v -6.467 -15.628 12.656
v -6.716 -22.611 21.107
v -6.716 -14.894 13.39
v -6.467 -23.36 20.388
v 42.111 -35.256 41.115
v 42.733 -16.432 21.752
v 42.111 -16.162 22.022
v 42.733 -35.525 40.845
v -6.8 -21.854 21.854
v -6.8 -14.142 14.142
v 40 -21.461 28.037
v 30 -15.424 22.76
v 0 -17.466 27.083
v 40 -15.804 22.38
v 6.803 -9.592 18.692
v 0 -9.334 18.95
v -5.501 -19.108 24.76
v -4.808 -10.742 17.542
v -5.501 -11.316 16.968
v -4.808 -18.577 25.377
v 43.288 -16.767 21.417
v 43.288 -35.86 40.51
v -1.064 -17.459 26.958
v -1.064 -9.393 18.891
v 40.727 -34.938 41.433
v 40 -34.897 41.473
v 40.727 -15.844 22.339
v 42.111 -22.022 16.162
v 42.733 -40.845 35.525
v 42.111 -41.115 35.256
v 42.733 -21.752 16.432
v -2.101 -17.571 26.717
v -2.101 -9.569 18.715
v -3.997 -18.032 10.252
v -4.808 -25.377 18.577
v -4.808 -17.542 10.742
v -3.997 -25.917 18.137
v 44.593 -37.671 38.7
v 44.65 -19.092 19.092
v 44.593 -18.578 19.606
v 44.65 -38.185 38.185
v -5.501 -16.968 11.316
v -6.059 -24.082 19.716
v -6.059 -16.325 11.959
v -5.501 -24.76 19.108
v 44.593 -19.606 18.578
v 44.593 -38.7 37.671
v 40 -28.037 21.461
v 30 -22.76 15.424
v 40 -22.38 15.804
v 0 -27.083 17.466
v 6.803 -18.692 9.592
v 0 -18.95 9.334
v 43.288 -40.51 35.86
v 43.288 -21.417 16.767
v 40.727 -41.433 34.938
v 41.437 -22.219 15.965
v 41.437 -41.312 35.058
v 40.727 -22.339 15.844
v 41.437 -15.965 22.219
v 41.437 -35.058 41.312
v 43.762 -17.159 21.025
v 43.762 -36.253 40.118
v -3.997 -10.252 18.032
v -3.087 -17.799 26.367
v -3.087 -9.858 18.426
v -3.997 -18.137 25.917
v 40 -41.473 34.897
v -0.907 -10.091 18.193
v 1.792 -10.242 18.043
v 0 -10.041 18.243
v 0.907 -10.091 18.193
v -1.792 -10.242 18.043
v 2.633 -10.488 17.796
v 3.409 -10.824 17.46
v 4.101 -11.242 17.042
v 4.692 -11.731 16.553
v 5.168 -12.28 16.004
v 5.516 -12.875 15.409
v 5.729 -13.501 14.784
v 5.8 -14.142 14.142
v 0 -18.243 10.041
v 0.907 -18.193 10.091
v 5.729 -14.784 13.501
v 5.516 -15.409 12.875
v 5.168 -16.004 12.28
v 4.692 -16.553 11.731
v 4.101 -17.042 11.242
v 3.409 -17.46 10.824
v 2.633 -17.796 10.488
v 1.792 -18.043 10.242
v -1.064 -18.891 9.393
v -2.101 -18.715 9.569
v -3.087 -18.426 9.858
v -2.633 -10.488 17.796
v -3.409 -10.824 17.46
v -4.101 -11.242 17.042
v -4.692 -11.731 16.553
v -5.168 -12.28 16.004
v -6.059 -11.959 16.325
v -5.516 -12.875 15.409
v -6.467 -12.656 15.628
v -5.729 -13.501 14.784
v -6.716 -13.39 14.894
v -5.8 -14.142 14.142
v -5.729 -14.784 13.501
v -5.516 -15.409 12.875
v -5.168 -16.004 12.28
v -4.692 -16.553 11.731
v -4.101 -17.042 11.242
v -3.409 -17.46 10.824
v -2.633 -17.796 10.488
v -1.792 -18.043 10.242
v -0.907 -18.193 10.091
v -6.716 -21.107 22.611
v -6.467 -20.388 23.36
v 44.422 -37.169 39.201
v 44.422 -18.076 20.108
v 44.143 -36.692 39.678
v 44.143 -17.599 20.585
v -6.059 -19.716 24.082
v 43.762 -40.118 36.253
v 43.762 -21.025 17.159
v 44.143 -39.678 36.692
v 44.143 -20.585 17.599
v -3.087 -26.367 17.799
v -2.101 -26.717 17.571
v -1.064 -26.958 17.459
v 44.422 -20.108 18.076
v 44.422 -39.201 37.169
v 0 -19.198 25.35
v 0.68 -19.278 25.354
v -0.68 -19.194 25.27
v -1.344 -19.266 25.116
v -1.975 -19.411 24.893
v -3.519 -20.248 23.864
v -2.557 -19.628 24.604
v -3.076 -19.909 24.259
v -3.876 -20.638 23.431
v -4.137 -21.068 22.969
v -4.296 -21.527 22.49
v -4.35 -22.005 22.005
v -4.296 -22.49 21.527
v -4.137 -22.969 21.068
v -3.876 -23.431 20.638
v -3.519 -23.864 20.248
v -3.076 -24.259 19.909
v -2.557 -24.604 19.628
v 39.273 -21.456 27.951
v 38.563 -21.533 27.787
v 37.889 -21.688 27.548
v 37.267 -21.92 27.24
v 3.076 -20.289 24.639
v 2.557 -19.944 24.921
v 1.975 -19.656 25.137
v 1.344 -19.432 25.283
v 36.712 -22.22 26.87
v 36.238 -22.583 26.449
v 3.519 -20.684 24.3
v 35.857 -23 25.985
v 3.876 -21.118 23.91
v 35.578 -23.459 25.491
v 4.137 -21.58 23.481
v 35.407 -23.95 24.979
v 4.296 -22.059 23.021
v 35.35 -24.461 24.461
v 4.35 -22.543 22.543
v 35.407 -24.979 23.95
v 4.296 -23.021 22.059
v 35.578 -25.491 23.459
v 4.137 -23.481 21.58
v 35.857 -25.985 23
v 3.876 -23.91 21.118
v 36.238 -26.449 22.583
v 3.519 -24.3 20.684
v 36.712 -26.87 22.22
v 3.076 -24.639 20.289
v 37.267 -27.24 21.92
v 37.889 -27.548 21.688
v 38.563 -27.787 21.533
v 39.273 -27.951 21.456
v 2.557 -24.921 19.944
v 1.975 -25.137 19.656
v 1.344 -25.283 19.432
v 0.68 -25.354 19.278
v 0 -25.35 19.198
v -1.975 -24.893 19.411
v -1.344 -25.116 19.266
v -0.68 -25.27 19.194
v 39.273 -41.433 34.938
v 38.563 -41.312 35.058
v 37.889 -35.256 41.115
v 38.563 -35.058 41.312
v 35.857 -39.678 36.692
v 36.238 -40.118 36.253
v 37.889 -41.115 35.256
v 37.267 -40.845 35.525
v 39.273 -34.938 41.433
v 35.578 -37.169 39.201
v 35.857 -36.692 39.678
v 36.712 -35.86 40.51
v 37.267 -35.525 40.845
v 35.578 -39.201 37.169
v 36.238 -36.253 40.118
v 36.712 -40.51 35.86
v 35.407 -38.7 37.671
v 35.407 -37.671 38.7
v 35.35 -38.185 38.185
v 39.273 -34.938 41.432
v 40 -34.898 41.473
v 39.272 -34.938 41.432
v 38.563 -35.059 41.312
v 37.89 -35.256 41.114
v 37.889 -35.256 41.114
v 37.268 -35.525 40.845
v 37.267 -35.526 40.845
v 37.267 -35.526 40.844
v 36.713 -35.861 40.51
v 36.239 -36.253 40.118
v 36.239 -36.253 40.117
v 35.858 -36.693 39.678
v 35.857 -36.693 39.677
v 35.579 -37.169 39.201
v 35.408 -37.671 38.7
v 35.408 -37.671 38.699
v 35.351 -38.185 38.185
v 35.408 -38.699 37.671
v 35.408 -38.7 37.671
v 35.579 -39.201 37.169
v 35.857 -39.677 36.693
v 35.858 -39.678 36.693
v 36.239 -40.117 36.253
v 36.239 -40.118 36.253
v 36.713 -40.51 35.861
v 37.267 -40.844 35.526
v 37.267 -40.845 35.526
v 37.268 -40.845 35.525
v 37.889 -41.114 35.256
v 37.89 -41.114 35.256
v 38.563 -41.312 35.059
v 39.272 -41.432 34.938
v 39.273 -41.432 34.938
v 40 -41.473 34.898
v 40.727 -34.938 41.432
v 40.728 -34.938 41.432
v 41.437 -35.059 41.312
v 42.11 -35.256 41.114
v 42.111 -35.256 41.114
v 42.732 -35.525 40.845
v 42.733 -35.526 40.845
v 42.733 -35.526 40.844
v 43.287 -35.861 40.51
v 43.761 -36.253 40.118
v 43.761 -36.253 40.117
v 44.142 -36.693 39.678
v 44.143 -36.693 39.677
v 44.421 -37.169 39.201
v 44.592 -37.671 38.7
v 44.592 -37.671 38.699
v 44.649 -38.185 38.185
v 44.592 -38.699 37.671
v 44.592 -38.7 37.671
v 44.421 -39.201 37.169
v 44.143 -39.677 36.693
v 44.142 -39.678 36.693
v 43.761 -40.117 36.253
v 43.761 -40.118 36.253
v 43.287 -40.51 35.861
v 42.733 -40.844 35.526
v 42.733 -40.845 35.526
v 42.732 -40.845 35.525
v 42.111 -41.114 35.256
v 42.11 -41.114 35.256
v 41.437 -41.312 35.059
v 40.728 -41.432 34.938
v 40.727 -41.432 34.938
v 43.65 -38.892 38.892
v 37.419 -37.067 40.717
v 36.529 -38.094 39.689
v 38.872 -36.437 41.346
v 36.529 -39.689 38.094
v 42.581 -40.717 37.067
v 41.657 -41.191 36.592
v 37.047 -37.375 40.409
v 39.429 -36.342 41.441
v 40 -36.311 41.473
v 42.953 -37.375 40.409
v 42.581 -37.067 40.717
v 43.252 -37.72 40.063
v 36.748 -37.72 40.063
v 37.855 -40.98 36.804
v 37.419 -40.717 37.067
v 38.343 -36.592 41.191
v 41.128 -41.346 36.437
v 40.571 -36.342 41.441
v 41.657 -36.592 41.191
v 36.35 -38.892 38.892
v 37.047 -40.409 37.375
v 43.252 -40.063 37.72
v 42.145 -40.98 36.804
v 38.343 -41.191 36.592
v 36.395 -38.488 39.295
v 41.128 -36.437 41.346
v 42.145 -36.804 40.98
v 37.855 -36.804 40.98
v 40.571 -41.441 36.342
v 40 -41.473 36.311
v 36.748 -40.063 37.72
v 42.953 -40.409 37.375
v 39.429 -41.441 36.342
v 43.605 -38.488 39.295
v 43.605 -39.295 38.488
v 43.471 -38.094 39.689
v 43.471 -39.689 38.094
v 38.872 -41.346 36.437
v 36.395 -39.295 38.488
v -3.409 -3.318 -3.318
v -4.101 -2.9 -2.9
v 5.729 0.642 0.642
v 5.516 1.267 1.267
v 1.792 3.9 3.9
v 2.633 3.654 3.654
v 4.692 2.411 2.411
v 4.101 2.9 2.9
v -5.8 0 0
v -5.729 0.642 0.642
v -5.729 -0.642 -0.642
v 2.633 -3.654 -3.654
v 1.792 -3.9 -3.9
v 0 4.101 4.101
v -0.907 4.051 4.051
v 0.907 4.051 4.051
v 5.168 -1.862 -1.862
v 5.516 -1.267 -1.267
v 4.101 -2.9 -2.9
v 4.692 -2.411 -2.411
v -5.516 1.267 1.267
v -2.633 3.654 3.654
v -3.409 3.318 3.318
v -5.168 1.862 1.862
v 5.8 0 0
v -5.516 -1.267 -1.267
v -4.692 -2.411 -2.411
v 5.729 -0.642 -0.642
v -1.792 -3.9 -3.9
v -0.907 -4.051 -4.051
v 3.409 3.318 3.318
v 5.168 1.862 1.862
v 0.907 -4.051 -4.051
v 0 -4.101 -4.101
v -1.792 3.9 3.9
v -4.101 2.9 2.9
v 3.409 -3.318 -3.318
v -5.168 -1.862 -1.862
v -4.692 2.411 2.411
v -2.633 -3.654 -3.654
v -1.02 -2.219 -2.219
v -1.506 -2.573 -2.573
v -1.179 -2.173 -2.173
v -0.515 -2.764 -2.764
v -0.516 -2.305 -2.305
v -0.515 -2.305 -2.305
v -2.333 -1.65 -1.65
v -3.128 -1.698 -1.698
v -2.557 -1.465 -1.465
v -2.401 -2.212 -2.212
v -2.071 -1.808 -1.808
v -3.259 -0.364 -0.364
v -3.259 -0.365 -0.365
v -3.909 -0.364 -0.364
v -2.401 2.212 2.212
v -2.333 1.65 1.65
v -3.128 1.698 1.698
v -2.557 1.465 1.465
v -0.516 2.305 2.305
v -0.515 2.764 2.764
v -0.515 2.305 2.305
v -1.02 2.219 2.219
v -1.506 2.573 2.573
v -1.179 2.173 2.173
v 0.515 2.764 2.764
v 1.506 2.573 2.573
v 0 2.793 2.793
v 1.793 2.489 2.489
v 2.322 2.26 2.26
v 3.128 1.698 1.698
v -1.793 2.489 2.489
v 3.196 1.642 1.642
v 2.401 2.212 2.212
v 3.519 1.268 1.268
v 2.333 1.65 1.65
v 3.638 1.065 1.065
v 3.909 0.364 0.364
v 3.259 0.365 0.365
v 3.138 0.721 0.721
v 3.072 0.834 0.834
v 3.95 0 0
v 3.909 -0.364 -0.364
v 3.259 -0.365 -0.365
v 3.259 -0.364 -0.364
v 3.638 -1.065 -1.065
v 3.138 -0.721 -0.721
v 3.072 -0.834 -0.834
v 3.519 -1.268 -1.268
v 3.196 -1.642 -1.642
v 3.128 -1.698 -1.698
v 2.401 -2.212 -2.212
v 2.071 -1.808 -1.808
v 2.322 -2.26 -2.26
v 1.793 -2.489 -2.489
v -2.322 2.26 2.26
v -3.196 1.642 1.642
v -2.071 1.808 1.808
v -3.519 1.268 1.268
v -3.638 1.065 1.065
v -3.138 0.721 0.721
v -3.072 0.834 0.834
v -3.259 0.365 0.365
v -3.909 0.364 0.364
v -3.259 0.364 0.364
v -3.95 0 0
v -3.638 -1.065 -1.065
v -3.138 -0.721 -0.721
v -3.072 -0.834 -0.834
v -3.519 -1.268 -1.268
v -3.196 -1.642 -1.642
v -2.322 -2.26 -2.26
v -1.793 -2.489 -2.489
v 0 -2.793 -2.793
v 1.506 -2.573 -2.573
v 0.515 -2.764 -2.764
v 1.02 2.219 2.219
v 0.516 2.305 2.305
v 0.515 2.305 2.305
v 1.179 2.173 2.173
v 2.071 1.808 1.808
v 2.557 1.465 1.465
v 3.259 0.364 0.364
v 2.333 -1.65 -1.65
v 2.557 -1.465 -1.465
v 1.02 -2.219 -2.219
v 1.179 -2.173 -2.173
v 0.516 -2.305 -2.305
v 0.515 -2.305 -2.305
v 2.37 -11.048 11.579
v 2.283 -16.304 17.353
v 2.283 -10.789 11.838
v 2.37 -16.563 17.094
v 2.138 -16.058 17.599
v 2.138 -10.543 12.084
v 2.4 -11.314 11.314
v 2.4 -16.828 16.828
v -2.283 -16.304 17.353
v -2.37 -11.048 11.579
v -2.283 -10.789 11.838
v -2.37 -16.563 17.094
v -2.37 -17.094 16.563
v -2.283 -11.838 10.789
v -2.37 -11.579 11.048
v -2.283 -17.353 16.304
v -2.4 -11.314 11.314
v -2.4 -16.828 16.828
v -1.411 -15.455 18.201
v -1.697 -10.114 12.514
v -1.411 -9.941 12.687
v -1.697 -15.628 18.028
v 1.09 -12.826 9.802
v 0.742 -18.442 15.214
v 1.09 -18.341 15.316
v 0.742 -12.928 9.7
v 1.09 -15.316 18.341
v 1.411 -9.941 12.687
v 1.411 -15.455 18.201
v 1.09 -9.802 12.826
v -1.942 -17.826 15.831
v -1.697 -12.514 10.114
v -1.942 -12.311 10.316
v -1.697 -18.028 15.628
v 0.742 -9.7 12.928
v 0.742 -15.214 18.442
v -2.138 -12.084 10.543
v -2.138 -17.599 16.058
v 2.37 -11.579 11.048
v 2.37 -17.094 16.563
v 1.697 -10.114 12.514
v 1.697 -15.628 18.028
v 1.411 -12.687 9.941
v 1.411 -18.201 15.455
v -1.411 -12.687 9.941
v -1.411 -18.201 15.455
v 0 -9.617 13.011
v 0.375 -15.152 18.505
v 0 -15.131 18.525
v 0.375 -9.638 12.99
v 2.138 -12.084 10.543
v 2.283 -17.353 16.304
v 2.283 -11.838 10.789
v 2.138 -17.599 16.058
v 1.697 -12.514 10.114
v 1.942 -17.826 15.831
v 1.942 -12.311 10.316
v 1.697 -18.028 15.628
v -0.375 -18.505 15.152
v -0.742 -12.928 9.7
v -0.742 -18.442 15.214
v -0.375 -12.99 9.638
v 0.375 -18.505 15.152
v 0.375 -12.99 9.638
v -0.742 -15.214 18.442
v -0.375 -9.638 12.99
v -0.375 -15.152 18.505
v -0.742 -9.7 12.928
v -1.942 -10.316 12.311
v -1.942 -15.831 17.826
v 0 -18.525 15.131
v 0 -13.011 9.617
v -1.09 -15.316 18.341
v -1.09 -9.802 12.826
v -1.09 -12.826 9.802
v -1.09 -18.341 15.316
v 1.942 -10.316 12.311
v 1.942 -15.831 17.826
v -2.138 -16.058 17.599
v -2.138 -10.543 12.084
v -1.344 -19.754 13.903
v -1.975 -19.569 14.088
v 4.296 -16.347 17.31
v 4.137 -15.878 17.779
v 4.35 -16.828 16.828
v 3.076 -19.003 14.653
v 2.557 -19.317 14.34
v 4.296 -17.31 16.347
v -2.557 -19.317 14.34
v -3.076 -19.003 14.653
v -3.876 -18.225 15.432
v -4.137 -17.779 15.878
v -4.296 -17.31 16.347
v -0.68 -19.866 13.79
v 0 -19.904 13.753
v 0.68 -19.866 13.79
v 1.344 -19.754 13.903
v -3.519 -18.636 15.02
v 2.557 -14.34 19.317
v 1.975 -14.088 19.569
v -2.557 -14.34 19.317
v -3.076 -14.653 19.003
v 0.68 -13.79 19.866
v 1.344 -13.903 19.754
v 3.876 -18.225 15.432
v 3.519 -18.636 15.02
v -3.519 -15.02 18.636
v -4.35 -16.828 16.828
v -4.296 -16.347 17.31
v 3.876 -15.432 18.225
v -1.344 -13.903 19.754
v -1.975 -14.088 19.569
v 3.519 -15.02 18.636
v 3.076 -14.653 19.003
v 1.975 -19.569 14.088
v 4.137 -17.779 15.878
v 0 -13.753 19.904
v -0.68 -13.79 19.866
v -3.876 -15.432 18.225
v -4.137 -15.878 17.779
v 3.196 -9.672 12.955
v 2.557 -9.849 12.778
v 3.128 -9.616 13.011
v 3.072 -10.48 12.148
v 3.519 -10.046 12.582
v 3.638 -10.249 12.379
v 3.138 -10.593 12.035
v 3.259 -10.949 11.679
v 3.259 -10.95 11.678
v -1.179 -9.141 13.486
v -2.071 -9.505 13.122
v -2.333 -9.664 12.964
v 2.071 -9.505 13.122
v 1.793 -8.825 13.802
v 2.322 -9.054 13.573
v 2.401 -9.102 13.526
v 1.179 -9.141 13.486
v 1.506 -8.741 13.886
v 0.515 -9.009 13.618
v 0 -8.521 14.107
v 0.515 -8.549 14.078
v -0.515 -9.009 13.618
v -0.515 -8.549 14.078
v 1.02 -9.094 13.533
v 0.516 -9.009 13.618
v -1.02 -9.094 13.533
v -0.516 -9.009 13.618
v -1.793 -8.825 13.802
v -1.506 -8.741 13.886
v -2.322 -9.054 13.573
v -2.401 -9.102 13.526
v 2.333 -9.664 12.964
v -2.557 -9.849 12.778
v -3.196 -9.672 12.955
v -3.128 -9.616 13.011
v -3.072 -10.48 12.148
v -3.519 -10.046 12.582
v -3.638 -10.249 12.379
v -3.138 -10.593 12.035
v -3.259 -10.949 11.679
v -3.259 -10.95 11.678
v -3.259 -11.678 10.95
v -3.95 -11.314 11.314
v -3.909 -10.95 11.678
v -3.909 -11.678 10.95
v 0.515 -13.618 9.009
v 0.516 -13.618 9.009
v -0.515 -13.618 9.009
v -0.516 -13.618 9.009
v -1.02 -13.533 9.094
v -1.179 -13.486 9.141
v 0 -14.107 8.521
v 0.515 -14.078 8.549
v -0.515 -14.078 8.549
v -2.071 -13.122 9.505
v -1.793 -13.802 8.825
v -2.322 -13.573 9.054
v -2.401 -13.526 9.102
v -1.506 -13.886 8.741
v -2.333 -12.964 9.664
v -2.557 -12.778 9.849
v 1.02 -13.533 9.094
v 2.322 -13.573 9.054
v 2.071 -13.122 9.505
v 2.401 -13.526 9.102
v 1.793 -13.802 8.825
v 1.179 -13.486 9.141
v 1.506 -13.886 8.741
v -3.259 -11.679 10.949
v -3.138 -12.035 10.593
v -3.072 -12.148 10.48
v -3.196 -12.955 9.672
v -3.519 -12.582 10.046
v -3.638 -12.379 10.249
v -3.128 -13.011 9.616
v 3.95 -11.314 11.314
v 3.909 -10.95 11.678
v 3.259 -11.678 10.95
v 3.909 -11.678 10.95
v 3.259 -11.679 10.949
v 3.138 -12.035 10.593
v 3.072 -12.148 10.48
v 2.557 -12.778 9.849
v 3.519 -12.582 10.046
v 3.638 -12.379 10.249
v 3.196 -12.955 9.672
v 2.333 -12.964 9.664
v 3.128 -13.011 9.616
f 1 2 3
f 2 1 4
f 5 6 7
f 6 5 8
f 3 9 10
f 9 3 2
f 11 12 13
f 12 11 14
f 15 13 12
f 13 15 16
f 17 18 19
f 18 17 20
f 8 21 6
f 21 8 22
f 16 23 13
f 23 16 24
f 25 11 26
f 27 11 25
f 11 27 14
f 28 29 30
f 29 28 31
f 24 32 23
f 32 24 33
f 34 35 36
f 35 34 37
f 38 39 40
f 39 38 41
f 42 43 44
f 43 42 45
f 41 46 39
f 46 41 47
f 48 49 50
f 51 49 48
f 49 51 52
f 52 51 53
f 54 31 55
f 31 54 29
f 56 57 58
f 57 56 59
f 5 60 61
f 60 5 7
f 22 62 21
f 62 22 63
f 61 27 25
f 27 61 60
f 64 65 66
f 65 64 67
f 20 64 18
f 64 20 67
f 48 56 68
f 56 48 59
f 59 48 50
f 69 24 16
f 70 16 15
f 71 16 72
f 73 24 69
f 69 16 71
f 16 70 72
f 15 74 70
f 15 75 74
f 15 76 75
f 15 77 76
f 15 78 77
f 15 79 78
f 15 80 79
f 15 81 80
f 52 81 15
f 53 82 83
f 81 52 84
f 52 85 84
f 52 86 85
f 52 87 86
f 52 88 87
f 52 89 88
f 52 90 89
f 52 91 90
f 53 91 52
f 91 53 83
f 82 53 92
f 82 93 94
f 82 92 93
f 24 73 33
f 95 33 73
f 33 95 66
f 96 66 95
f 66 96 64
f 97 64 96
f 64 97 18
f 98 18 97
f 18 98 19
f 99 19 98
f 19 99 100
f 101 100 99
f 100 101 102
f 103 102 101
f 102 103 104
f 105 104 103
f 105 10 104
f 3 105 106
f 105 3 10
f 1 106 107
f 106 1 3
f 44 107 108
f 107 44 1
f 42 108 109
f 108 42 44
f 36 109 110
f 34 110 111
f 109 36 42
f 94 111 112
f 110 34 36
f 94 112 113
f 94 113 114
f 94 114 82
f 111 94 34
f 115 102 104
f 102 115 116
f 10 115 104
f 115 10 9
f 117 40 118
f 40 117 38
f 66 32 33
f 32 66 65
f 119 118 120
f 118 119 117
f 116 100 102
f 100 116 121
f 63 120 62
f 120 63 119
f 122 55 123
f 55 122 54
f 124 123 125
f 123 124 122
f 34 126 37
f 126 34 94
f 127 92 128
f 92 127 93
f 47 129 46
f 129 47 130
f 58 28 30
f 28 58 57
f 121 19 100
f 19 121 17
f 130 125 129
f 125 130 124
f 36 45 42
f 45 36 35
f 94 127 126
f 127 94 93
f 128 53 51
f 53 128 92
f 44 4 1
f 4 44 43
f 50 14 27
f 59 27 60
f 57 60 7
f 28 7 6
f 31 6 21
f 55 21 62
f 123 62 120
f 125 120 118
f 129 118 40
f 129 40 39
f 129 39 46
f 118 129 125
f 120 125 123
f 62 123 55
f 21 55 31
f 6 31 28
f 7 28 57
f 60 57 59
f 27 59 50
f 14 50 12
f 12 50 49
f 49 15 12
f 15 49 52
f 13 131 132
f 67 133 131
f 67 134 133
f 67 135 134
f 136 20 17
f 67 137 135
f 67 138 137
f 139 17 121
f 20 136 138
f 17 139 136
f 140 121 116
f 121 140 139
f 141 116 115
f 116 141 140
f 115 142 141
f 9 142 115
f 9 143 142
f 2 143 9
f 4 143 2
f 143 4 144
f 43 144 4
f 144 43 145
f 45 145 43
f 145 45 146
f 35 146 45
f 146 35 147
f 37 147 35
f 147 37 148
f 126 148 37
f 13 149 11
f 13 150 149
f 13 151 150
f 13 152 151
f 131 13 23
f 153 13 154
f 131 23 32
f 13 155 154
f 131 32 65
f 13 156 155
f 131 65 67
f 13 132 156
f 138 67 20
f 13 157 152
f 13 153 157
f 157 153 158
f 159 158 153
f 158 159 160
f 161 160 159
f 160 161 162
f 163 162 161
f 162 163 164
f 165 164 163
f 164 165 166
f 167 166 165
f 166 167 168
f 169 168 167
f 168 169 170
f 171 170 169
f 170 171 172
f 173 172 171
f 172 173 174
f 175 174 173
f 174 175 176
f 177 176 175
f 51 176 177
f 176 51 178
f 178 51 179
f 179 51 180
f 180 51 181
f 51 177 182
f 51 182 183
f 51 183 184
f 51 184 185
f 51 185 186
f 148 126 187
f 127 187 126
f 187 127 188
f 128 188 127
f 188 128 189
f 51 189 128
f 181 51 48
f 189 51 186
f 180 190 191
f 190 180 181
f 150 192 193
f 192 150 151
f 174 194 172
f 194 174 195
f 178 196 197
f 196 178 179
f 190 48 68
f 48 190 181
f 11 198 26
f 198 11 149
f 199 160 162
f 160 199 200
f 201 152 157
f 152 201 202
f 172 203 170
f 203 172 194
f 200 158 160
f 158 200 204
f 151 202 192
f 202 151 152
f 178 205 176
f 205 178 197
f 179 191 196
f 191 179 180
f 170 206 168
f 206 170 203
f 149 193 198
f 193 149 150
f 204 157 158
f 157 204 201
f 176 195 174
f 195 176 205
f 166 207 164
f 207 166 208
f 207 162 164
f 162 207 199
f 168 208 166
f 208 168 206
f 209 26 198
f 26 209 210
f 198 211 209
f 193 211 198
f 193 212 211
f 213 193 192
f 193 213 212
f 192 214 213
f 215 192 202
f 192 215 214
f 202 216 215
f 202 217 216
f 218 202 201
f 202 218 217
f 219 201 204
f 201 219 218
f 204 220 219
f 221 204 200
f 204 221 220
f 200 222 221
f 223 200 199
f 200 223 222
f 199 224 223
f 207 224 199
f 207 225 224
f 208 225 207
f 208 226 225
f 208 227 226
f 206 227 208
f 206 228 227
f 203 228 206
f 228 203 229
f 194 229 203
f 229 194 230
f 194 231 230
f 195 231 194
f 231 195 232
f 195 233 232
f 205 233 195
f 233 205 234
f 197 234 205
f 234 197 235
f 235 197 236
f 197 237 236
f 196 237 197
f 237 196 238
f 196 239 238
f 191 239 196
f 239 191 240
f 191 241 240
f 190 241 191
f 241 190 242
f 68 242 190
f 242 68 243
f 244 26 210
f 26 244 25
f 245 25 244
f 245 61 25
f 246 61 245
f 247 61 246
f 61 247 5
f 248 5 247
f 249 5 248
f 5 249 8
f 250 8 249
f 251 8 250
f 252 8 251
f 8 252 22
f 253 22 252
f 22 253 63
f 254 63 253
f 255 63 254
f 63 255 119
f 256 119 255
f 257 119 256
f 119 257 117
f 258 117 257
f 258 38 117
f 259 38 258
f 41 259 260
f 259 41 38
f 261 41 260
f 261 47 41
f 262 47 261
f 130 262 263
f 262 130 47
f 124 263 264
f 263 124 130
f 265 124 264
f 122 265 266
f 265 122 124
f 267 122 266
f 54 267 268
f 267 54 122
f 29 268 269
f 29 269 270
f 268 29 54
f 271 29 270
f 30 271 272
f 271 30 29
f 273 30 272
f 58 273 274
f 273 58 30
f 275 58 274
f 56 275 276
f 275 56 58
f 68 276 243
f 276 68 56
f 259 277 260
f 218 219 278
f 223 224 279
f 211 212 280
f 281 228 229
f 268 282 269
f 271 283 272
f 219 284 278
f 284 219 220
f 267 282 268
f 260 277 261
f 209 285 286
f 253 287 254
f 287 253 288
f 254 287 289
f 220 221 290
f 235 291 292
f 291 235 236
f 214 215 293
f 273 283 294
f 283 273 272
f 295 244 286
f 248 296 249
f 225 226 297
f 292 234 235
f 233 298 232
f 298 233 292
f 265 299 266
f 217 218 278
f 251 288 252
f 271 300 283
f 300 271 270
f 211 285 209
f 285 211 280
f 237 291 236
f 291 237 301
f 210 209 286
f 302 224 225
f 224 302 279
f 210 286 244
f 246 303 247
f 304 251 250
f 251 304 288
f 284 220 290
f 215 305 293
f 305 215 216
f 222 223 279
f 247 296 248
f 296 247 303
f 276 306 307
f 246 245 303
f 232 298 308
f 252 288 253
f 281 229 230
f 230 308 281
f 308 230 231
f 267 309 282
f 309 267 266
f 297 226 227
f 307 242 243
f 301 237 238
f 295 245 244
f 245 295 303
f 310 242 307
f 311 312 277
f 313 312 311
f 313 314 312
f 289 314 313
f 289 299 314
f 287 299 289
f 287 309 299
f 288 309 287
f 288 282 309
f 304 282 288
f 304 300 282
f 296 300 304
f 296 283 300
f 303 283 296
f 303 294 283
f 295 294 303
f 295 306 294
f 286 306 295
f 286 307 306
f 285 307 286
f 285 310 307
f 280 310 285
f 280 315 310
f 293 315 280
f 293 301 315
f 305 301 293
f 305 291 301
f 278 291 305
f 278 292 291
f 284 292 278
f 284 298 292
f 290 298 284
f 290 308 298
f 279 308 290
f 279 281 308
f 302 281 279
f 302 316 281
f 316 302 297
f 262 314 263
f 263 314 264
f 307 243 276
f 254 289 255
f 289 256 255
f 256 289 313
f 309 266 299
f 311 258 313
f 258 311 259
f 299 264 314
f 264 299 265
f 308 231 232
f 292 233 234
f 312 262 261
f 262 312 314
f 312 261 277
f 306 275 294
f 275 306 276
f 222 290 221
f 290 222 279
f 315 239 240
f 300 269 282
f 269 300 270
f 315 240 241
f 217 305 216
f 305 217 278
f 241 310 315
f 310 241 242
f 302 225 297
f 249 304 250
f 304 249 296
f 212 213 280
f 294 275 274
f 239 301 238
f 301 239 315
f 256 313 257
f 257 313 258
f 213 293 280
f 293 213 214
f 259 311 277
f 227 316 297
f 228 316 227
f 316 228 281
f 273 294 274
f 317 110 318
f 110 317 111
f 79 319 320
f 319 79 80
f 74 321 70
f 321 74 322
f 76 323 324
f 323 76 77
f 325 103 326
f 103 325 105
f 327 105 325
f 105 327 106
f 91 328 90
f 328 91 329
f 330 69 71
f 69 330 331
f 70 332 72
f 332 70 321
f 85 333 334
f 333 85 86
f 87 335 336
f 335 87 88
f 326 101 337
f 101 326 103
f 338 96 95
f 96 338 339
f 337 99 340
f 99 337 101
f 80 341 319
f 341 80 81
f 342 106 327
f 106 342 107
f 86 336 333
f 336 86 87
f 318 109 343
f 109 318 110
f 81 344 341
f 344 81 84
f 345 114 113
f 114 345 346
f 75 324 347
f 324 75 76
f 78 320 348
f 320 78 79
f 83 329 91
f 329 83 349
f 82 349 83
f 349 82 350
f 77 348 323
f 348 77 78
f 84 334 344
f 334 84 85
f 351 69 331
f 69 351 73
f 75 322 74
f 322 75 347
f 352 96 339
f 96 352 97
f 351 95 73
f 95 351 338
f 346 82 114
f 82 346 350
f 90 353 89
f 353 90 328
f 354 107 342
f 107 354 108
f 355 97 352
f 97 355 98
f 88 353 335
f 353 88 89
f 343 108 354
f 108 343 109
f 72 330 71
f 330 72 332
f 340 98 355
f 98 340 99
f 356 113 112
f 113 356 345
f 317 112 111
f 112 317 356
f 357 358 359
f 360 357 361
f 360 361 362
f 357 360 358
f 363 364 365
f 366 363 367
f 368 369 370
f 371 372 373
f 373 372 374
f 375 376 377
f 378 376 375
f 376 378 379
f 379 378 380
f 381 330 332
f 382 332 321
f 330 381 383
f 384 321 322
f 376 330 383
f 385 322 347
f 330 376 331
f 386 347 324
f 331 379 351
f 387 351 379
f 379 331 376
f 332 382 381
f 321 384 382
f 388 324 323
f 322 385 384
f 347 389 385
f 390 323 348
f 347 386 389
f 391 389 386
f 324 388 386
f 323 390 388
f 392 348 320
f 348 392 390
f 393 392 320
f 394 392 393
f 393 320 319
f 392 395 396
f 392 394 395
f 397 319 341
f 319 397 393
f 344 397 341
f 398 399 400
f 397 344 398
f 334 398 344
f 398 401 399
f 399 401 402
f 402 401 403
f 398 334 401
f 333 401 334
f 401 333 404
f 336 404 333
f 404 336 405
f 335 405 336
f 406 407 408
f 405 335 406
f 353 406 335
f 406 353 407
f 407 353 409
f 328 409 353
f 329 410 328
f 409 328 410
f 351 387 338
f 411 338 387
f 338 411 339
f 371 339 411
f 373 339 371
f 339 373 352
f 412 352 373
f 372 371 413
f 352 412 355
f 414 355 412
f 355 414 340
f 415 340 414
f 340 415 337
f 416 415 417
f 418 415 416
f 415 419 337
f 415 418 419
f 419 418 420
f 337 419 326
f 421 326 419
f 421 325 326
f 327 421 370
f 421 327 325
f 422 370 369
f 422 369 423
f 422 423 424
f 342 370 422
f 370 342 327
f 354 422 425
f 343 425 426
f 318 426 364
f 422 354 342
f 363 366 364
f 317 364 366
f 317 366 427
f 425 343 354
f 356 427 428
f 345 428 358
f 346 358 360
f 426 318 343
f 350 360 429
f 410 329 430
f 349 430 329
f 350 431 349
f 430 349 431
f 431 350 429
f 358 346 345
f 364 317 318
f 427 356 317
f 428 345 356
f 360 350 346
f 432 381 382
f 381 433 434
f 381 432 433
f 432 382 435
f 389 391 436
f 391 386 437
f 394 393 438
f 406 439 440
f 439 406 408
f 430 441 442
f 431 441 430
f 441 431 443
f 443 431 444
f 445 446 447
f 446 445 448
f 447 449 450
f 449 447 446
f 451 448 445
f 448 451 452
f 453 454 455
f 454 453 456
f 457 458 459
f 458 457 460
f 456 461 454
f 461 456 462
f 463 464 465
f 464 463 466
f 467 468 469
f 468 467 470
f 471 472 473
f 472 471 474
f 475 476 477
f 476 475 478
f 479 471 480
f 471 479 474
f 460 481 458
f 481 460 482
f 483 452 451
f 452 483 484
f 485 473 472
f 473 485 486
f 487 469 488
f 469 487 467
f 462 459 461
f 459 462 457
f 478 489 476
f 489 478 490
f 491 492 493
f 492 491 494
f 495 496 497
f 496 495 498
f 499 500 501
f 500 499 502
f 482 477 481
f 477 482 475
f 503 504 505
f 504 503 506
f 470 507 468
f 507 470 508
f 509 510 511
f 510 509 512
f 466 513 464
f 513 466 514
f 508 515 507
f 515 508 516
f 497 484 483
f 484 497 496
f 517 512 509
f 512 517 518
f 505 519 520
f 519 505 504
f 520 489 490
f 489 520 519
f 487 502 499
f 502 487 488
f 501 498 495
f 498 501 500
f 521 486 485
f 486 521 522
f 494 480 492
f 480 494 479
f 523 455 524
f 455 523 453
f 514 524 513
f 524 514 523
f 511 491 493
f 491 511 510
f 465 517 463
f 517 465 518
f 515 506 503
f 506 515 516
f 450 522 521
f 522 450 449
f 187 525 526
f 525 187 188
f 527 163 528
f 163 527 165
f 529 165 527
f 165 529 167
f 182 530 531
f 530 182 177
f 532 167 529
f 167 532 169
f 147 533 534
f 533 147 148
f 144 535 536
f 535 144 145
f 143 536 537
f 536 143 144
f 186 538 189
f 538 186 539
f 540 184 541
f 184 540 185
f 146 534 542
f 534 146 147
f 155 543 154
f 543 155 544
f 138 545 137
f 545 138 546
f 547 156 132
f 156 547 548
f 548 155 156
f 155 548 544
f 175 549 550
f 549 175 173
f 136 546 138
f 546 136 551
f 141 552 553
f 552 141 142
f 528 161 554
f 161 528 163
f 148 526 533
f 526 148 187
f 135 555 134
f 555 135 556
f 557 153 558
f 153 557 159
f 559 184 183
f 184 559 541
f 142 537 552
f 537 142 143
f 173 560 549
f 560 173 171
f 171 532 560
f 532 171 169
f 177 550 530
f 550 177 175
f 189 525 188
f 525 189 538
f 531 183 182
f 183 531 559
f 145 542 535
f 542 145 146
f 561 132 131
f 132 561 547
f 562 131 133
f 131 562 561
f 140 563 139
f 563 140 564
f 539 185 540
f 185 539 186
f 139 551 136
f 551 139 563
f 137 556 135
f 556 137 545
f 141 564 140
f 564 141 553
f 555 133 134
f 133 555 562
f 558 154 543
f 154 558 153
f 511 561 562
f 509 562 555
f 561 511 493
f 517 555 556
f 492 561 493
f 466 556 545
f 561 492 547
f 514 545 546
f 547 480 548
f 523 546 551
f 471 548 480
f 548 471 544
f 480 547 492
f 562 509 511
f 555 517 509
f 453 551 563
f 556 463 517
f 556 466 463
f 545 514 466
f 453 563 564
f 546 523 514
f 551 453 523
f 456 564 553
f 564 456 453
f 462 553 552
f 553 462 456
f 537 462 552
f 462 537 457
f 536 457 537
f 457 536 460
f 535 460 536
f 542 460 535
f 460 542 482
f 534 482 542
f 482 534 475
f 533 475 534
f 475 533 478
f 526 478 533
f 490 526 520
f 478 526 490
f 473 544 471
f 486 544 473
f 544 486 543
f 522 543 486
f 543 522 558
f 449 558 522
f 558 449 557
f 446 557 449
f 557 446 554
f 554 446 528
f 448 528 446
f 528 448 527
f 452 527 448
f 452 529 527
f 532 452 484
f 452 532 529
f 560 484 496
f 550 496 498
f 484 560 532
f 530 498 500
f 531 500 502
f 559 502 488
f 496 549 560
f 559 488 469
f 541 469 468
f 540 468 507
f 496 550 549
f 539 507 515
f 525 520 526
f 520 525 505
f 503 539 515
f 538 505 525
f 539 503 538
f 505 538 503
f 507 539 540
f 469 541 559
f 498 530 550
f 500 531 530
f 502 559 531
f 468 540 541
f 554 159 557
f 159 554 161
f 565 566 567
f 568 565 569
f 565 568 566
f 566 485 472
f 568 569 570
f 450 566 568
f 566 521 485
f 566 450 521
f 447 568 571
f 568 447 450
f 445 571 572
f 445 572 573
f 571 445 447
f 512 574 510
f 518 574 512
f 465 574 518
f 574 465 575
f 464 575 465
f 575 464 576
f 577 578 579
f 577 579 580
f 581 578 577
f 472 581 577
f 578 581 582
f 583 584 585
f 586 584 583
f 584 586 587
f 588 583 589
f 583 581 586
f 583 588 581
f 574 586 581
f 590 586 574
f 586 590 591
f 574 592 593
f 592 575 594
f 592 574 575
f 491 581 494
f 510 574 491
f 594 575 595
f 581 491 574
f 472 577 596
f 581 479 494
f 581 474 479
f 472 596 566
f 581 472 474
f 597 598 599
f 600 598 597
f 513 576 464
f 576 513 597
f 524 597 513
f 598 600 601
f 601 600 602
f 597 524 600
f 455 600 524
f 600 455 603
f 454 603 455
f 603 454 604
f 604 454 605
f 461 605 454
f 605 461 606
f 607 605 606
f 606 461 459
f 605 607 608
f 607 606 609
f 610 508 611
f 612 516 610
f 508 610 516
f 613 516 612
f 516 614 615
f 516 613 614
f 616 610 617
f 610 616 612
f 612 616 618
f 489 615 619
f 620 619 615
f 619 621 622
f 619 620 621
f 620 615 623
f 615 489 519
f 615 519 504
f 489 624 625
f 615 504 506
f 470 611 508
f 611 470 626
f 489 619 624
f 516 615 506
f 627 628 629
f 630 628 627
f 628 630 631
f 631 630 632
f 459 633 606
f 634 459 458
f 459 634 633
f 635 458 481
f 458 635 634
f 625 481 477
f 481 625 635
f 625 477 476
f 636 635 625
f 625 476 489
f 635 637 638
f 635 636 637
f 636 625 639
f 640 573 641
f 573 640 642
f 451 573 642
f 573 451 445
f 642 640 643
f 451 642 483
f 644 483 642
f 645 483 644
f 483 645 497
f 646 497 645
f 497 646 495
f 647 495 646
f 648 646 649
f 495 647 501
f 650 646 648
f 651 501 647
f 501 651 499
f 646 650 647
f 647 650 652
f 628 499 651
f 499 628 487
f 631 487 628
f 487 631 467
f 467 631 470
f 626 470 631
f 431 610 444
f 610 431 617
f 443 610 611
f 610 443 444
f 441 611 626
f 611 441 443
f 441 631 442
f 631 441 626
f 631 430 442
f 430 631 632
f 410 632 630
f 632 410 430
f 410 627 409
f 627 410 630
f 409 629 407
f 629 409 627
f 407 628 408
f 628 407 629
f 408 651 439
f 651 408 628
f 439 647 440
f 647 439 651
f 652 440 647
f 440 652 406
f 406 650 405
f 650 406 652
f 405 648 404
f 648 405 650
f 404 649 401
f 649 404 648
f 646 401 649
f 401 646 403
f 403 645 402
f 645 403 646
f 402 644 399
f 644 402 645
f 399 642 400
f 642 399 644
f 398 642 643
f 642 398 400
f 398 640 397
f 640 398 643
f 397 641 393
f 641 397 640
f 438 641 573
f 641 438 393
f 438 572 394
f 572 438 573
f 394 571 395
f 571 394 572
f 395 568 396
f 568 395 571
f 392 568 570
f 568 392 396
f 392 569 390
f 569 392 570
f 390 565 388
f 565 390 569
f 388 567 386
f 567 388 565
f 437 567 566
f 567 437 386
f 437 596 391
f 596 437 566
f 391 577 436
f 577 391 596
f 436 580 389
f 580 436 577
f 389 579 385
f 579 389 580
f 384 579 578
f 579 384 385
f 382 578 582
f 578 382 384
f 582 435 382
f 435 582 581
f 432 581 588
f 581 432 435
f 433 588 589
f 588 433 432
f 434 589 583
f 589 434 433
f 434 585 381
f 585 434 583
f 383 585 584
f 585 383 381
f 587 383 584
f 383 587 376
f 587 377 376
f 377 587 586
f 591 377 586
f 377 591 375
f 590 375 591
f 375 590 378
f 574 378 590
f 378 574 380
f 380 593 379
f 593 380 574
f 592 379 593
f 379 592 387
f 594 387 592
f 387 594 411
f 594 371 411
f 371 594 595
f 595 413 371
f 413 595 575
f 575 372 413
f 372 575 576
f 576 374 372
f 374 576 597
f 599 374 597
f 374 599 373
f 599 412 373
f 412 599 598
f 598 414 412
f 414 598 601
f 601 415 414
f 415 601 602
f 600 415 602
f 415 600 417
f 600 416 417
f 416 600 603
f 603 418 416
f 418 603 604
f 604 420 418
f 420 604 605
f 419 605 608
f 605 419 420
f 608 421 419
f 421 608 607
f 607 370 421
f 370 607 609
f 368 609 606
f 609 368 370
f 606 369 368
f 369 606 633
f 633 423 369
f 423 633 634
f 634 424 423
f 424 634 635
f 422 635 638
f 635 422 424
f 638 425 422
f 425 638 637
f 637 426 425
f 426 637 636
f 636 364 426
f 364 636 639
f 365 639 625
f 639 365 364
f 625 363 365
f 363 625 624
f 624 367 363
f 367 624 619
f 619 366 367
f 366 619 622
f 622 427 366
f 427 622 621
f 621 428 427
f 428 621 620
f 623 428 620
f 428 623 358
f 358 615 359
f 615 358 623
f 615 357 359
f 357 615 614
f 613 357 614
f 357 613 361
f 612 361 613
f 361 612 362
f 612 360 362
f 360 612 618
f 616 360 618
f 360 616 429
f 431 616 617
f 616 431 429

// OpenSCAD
eps = 0.001;
$fn = 40;

spline_count = 12;

spline_id_max = 7.9;
spline_id_min = 6.6;

screw_hole_id = 4.8;
screw_head_hole_id = 8.7;

shaft_od = 11.6;
arm_base_od = 13.6;
arm_end_od = 9.3;

shaft_length = 20;
arm_radius = 40;
crank_height = 15;
handle_length = 35;

module plug() {
  spline_length = 16;
  screw_hold_length = 7.8;
  
  translate([0, 0, -eps]) {
    linear_extrude(spline_length + eps) {
      circle(d=spline_id_min);
      intersection() {
        circle(d=spline_id_max);
        for (a = [0:5])
          rotate([0, 0, a*30])
            square([100, 1.03], center=true);
      }
    }
    translate([0, 0, spline_length]) {
      linear_extrude(screw_hold_length + eps)
        circle(d=screw_hole_id);
      translate([0, 0, screw_hold_length]) {
        linear_extrude(50)
          circle(d=screw_head_hole_id);
      }
    }
  }
}

module exterior() {
  // Bottom shaft.
  cylinder(h=shaft_length+eps, d=shaft_od);
  
  // Crank arm.
  translate([0, 0, shaft_length]) {
    difference() {
      linear_extrude(crank_height) {
        hull() {
          circle(d=arm_base_od);
          translate([arm_radius, 0])
            circle(d=arm_end_od);
        }
      }
      
      // Cut out the bottom.
      translate([0, -10, 0]) {
        hull() {
          translate([arm_base_od/2, 0, -20-eps])
            cube(20);
          translate([arm_radius-10, 0, -13])
            cube(20);
        }
      }
      
      // Cut out the top.
      scale([-1, 1, 1])
        translate([-arm_radius, -50, crank_height])
          rotate([0, 5, 0])
            translate([arm_radius-50, 0, 0])
              cube(100);
    }
  }
  
  // Handle.
  translate([arm_radius, 0, shaft_length+7+eps]) {
    cylinder(h=handle_length-8+eps, d=arm_end_od);
    translate([0, 0, handle_length-8])
      cylinder(h=1, d1=arm_end_od, d2=arm_end_od-2);
  }
}

module piece() {
  rotate([45, 0, 0]) {
    difference() {
      exterior();
      plug();
    }
  }
}

module support() {
  linear_extrude(50)
    offset(-1)
      projection()
        piece();
}

piece();
